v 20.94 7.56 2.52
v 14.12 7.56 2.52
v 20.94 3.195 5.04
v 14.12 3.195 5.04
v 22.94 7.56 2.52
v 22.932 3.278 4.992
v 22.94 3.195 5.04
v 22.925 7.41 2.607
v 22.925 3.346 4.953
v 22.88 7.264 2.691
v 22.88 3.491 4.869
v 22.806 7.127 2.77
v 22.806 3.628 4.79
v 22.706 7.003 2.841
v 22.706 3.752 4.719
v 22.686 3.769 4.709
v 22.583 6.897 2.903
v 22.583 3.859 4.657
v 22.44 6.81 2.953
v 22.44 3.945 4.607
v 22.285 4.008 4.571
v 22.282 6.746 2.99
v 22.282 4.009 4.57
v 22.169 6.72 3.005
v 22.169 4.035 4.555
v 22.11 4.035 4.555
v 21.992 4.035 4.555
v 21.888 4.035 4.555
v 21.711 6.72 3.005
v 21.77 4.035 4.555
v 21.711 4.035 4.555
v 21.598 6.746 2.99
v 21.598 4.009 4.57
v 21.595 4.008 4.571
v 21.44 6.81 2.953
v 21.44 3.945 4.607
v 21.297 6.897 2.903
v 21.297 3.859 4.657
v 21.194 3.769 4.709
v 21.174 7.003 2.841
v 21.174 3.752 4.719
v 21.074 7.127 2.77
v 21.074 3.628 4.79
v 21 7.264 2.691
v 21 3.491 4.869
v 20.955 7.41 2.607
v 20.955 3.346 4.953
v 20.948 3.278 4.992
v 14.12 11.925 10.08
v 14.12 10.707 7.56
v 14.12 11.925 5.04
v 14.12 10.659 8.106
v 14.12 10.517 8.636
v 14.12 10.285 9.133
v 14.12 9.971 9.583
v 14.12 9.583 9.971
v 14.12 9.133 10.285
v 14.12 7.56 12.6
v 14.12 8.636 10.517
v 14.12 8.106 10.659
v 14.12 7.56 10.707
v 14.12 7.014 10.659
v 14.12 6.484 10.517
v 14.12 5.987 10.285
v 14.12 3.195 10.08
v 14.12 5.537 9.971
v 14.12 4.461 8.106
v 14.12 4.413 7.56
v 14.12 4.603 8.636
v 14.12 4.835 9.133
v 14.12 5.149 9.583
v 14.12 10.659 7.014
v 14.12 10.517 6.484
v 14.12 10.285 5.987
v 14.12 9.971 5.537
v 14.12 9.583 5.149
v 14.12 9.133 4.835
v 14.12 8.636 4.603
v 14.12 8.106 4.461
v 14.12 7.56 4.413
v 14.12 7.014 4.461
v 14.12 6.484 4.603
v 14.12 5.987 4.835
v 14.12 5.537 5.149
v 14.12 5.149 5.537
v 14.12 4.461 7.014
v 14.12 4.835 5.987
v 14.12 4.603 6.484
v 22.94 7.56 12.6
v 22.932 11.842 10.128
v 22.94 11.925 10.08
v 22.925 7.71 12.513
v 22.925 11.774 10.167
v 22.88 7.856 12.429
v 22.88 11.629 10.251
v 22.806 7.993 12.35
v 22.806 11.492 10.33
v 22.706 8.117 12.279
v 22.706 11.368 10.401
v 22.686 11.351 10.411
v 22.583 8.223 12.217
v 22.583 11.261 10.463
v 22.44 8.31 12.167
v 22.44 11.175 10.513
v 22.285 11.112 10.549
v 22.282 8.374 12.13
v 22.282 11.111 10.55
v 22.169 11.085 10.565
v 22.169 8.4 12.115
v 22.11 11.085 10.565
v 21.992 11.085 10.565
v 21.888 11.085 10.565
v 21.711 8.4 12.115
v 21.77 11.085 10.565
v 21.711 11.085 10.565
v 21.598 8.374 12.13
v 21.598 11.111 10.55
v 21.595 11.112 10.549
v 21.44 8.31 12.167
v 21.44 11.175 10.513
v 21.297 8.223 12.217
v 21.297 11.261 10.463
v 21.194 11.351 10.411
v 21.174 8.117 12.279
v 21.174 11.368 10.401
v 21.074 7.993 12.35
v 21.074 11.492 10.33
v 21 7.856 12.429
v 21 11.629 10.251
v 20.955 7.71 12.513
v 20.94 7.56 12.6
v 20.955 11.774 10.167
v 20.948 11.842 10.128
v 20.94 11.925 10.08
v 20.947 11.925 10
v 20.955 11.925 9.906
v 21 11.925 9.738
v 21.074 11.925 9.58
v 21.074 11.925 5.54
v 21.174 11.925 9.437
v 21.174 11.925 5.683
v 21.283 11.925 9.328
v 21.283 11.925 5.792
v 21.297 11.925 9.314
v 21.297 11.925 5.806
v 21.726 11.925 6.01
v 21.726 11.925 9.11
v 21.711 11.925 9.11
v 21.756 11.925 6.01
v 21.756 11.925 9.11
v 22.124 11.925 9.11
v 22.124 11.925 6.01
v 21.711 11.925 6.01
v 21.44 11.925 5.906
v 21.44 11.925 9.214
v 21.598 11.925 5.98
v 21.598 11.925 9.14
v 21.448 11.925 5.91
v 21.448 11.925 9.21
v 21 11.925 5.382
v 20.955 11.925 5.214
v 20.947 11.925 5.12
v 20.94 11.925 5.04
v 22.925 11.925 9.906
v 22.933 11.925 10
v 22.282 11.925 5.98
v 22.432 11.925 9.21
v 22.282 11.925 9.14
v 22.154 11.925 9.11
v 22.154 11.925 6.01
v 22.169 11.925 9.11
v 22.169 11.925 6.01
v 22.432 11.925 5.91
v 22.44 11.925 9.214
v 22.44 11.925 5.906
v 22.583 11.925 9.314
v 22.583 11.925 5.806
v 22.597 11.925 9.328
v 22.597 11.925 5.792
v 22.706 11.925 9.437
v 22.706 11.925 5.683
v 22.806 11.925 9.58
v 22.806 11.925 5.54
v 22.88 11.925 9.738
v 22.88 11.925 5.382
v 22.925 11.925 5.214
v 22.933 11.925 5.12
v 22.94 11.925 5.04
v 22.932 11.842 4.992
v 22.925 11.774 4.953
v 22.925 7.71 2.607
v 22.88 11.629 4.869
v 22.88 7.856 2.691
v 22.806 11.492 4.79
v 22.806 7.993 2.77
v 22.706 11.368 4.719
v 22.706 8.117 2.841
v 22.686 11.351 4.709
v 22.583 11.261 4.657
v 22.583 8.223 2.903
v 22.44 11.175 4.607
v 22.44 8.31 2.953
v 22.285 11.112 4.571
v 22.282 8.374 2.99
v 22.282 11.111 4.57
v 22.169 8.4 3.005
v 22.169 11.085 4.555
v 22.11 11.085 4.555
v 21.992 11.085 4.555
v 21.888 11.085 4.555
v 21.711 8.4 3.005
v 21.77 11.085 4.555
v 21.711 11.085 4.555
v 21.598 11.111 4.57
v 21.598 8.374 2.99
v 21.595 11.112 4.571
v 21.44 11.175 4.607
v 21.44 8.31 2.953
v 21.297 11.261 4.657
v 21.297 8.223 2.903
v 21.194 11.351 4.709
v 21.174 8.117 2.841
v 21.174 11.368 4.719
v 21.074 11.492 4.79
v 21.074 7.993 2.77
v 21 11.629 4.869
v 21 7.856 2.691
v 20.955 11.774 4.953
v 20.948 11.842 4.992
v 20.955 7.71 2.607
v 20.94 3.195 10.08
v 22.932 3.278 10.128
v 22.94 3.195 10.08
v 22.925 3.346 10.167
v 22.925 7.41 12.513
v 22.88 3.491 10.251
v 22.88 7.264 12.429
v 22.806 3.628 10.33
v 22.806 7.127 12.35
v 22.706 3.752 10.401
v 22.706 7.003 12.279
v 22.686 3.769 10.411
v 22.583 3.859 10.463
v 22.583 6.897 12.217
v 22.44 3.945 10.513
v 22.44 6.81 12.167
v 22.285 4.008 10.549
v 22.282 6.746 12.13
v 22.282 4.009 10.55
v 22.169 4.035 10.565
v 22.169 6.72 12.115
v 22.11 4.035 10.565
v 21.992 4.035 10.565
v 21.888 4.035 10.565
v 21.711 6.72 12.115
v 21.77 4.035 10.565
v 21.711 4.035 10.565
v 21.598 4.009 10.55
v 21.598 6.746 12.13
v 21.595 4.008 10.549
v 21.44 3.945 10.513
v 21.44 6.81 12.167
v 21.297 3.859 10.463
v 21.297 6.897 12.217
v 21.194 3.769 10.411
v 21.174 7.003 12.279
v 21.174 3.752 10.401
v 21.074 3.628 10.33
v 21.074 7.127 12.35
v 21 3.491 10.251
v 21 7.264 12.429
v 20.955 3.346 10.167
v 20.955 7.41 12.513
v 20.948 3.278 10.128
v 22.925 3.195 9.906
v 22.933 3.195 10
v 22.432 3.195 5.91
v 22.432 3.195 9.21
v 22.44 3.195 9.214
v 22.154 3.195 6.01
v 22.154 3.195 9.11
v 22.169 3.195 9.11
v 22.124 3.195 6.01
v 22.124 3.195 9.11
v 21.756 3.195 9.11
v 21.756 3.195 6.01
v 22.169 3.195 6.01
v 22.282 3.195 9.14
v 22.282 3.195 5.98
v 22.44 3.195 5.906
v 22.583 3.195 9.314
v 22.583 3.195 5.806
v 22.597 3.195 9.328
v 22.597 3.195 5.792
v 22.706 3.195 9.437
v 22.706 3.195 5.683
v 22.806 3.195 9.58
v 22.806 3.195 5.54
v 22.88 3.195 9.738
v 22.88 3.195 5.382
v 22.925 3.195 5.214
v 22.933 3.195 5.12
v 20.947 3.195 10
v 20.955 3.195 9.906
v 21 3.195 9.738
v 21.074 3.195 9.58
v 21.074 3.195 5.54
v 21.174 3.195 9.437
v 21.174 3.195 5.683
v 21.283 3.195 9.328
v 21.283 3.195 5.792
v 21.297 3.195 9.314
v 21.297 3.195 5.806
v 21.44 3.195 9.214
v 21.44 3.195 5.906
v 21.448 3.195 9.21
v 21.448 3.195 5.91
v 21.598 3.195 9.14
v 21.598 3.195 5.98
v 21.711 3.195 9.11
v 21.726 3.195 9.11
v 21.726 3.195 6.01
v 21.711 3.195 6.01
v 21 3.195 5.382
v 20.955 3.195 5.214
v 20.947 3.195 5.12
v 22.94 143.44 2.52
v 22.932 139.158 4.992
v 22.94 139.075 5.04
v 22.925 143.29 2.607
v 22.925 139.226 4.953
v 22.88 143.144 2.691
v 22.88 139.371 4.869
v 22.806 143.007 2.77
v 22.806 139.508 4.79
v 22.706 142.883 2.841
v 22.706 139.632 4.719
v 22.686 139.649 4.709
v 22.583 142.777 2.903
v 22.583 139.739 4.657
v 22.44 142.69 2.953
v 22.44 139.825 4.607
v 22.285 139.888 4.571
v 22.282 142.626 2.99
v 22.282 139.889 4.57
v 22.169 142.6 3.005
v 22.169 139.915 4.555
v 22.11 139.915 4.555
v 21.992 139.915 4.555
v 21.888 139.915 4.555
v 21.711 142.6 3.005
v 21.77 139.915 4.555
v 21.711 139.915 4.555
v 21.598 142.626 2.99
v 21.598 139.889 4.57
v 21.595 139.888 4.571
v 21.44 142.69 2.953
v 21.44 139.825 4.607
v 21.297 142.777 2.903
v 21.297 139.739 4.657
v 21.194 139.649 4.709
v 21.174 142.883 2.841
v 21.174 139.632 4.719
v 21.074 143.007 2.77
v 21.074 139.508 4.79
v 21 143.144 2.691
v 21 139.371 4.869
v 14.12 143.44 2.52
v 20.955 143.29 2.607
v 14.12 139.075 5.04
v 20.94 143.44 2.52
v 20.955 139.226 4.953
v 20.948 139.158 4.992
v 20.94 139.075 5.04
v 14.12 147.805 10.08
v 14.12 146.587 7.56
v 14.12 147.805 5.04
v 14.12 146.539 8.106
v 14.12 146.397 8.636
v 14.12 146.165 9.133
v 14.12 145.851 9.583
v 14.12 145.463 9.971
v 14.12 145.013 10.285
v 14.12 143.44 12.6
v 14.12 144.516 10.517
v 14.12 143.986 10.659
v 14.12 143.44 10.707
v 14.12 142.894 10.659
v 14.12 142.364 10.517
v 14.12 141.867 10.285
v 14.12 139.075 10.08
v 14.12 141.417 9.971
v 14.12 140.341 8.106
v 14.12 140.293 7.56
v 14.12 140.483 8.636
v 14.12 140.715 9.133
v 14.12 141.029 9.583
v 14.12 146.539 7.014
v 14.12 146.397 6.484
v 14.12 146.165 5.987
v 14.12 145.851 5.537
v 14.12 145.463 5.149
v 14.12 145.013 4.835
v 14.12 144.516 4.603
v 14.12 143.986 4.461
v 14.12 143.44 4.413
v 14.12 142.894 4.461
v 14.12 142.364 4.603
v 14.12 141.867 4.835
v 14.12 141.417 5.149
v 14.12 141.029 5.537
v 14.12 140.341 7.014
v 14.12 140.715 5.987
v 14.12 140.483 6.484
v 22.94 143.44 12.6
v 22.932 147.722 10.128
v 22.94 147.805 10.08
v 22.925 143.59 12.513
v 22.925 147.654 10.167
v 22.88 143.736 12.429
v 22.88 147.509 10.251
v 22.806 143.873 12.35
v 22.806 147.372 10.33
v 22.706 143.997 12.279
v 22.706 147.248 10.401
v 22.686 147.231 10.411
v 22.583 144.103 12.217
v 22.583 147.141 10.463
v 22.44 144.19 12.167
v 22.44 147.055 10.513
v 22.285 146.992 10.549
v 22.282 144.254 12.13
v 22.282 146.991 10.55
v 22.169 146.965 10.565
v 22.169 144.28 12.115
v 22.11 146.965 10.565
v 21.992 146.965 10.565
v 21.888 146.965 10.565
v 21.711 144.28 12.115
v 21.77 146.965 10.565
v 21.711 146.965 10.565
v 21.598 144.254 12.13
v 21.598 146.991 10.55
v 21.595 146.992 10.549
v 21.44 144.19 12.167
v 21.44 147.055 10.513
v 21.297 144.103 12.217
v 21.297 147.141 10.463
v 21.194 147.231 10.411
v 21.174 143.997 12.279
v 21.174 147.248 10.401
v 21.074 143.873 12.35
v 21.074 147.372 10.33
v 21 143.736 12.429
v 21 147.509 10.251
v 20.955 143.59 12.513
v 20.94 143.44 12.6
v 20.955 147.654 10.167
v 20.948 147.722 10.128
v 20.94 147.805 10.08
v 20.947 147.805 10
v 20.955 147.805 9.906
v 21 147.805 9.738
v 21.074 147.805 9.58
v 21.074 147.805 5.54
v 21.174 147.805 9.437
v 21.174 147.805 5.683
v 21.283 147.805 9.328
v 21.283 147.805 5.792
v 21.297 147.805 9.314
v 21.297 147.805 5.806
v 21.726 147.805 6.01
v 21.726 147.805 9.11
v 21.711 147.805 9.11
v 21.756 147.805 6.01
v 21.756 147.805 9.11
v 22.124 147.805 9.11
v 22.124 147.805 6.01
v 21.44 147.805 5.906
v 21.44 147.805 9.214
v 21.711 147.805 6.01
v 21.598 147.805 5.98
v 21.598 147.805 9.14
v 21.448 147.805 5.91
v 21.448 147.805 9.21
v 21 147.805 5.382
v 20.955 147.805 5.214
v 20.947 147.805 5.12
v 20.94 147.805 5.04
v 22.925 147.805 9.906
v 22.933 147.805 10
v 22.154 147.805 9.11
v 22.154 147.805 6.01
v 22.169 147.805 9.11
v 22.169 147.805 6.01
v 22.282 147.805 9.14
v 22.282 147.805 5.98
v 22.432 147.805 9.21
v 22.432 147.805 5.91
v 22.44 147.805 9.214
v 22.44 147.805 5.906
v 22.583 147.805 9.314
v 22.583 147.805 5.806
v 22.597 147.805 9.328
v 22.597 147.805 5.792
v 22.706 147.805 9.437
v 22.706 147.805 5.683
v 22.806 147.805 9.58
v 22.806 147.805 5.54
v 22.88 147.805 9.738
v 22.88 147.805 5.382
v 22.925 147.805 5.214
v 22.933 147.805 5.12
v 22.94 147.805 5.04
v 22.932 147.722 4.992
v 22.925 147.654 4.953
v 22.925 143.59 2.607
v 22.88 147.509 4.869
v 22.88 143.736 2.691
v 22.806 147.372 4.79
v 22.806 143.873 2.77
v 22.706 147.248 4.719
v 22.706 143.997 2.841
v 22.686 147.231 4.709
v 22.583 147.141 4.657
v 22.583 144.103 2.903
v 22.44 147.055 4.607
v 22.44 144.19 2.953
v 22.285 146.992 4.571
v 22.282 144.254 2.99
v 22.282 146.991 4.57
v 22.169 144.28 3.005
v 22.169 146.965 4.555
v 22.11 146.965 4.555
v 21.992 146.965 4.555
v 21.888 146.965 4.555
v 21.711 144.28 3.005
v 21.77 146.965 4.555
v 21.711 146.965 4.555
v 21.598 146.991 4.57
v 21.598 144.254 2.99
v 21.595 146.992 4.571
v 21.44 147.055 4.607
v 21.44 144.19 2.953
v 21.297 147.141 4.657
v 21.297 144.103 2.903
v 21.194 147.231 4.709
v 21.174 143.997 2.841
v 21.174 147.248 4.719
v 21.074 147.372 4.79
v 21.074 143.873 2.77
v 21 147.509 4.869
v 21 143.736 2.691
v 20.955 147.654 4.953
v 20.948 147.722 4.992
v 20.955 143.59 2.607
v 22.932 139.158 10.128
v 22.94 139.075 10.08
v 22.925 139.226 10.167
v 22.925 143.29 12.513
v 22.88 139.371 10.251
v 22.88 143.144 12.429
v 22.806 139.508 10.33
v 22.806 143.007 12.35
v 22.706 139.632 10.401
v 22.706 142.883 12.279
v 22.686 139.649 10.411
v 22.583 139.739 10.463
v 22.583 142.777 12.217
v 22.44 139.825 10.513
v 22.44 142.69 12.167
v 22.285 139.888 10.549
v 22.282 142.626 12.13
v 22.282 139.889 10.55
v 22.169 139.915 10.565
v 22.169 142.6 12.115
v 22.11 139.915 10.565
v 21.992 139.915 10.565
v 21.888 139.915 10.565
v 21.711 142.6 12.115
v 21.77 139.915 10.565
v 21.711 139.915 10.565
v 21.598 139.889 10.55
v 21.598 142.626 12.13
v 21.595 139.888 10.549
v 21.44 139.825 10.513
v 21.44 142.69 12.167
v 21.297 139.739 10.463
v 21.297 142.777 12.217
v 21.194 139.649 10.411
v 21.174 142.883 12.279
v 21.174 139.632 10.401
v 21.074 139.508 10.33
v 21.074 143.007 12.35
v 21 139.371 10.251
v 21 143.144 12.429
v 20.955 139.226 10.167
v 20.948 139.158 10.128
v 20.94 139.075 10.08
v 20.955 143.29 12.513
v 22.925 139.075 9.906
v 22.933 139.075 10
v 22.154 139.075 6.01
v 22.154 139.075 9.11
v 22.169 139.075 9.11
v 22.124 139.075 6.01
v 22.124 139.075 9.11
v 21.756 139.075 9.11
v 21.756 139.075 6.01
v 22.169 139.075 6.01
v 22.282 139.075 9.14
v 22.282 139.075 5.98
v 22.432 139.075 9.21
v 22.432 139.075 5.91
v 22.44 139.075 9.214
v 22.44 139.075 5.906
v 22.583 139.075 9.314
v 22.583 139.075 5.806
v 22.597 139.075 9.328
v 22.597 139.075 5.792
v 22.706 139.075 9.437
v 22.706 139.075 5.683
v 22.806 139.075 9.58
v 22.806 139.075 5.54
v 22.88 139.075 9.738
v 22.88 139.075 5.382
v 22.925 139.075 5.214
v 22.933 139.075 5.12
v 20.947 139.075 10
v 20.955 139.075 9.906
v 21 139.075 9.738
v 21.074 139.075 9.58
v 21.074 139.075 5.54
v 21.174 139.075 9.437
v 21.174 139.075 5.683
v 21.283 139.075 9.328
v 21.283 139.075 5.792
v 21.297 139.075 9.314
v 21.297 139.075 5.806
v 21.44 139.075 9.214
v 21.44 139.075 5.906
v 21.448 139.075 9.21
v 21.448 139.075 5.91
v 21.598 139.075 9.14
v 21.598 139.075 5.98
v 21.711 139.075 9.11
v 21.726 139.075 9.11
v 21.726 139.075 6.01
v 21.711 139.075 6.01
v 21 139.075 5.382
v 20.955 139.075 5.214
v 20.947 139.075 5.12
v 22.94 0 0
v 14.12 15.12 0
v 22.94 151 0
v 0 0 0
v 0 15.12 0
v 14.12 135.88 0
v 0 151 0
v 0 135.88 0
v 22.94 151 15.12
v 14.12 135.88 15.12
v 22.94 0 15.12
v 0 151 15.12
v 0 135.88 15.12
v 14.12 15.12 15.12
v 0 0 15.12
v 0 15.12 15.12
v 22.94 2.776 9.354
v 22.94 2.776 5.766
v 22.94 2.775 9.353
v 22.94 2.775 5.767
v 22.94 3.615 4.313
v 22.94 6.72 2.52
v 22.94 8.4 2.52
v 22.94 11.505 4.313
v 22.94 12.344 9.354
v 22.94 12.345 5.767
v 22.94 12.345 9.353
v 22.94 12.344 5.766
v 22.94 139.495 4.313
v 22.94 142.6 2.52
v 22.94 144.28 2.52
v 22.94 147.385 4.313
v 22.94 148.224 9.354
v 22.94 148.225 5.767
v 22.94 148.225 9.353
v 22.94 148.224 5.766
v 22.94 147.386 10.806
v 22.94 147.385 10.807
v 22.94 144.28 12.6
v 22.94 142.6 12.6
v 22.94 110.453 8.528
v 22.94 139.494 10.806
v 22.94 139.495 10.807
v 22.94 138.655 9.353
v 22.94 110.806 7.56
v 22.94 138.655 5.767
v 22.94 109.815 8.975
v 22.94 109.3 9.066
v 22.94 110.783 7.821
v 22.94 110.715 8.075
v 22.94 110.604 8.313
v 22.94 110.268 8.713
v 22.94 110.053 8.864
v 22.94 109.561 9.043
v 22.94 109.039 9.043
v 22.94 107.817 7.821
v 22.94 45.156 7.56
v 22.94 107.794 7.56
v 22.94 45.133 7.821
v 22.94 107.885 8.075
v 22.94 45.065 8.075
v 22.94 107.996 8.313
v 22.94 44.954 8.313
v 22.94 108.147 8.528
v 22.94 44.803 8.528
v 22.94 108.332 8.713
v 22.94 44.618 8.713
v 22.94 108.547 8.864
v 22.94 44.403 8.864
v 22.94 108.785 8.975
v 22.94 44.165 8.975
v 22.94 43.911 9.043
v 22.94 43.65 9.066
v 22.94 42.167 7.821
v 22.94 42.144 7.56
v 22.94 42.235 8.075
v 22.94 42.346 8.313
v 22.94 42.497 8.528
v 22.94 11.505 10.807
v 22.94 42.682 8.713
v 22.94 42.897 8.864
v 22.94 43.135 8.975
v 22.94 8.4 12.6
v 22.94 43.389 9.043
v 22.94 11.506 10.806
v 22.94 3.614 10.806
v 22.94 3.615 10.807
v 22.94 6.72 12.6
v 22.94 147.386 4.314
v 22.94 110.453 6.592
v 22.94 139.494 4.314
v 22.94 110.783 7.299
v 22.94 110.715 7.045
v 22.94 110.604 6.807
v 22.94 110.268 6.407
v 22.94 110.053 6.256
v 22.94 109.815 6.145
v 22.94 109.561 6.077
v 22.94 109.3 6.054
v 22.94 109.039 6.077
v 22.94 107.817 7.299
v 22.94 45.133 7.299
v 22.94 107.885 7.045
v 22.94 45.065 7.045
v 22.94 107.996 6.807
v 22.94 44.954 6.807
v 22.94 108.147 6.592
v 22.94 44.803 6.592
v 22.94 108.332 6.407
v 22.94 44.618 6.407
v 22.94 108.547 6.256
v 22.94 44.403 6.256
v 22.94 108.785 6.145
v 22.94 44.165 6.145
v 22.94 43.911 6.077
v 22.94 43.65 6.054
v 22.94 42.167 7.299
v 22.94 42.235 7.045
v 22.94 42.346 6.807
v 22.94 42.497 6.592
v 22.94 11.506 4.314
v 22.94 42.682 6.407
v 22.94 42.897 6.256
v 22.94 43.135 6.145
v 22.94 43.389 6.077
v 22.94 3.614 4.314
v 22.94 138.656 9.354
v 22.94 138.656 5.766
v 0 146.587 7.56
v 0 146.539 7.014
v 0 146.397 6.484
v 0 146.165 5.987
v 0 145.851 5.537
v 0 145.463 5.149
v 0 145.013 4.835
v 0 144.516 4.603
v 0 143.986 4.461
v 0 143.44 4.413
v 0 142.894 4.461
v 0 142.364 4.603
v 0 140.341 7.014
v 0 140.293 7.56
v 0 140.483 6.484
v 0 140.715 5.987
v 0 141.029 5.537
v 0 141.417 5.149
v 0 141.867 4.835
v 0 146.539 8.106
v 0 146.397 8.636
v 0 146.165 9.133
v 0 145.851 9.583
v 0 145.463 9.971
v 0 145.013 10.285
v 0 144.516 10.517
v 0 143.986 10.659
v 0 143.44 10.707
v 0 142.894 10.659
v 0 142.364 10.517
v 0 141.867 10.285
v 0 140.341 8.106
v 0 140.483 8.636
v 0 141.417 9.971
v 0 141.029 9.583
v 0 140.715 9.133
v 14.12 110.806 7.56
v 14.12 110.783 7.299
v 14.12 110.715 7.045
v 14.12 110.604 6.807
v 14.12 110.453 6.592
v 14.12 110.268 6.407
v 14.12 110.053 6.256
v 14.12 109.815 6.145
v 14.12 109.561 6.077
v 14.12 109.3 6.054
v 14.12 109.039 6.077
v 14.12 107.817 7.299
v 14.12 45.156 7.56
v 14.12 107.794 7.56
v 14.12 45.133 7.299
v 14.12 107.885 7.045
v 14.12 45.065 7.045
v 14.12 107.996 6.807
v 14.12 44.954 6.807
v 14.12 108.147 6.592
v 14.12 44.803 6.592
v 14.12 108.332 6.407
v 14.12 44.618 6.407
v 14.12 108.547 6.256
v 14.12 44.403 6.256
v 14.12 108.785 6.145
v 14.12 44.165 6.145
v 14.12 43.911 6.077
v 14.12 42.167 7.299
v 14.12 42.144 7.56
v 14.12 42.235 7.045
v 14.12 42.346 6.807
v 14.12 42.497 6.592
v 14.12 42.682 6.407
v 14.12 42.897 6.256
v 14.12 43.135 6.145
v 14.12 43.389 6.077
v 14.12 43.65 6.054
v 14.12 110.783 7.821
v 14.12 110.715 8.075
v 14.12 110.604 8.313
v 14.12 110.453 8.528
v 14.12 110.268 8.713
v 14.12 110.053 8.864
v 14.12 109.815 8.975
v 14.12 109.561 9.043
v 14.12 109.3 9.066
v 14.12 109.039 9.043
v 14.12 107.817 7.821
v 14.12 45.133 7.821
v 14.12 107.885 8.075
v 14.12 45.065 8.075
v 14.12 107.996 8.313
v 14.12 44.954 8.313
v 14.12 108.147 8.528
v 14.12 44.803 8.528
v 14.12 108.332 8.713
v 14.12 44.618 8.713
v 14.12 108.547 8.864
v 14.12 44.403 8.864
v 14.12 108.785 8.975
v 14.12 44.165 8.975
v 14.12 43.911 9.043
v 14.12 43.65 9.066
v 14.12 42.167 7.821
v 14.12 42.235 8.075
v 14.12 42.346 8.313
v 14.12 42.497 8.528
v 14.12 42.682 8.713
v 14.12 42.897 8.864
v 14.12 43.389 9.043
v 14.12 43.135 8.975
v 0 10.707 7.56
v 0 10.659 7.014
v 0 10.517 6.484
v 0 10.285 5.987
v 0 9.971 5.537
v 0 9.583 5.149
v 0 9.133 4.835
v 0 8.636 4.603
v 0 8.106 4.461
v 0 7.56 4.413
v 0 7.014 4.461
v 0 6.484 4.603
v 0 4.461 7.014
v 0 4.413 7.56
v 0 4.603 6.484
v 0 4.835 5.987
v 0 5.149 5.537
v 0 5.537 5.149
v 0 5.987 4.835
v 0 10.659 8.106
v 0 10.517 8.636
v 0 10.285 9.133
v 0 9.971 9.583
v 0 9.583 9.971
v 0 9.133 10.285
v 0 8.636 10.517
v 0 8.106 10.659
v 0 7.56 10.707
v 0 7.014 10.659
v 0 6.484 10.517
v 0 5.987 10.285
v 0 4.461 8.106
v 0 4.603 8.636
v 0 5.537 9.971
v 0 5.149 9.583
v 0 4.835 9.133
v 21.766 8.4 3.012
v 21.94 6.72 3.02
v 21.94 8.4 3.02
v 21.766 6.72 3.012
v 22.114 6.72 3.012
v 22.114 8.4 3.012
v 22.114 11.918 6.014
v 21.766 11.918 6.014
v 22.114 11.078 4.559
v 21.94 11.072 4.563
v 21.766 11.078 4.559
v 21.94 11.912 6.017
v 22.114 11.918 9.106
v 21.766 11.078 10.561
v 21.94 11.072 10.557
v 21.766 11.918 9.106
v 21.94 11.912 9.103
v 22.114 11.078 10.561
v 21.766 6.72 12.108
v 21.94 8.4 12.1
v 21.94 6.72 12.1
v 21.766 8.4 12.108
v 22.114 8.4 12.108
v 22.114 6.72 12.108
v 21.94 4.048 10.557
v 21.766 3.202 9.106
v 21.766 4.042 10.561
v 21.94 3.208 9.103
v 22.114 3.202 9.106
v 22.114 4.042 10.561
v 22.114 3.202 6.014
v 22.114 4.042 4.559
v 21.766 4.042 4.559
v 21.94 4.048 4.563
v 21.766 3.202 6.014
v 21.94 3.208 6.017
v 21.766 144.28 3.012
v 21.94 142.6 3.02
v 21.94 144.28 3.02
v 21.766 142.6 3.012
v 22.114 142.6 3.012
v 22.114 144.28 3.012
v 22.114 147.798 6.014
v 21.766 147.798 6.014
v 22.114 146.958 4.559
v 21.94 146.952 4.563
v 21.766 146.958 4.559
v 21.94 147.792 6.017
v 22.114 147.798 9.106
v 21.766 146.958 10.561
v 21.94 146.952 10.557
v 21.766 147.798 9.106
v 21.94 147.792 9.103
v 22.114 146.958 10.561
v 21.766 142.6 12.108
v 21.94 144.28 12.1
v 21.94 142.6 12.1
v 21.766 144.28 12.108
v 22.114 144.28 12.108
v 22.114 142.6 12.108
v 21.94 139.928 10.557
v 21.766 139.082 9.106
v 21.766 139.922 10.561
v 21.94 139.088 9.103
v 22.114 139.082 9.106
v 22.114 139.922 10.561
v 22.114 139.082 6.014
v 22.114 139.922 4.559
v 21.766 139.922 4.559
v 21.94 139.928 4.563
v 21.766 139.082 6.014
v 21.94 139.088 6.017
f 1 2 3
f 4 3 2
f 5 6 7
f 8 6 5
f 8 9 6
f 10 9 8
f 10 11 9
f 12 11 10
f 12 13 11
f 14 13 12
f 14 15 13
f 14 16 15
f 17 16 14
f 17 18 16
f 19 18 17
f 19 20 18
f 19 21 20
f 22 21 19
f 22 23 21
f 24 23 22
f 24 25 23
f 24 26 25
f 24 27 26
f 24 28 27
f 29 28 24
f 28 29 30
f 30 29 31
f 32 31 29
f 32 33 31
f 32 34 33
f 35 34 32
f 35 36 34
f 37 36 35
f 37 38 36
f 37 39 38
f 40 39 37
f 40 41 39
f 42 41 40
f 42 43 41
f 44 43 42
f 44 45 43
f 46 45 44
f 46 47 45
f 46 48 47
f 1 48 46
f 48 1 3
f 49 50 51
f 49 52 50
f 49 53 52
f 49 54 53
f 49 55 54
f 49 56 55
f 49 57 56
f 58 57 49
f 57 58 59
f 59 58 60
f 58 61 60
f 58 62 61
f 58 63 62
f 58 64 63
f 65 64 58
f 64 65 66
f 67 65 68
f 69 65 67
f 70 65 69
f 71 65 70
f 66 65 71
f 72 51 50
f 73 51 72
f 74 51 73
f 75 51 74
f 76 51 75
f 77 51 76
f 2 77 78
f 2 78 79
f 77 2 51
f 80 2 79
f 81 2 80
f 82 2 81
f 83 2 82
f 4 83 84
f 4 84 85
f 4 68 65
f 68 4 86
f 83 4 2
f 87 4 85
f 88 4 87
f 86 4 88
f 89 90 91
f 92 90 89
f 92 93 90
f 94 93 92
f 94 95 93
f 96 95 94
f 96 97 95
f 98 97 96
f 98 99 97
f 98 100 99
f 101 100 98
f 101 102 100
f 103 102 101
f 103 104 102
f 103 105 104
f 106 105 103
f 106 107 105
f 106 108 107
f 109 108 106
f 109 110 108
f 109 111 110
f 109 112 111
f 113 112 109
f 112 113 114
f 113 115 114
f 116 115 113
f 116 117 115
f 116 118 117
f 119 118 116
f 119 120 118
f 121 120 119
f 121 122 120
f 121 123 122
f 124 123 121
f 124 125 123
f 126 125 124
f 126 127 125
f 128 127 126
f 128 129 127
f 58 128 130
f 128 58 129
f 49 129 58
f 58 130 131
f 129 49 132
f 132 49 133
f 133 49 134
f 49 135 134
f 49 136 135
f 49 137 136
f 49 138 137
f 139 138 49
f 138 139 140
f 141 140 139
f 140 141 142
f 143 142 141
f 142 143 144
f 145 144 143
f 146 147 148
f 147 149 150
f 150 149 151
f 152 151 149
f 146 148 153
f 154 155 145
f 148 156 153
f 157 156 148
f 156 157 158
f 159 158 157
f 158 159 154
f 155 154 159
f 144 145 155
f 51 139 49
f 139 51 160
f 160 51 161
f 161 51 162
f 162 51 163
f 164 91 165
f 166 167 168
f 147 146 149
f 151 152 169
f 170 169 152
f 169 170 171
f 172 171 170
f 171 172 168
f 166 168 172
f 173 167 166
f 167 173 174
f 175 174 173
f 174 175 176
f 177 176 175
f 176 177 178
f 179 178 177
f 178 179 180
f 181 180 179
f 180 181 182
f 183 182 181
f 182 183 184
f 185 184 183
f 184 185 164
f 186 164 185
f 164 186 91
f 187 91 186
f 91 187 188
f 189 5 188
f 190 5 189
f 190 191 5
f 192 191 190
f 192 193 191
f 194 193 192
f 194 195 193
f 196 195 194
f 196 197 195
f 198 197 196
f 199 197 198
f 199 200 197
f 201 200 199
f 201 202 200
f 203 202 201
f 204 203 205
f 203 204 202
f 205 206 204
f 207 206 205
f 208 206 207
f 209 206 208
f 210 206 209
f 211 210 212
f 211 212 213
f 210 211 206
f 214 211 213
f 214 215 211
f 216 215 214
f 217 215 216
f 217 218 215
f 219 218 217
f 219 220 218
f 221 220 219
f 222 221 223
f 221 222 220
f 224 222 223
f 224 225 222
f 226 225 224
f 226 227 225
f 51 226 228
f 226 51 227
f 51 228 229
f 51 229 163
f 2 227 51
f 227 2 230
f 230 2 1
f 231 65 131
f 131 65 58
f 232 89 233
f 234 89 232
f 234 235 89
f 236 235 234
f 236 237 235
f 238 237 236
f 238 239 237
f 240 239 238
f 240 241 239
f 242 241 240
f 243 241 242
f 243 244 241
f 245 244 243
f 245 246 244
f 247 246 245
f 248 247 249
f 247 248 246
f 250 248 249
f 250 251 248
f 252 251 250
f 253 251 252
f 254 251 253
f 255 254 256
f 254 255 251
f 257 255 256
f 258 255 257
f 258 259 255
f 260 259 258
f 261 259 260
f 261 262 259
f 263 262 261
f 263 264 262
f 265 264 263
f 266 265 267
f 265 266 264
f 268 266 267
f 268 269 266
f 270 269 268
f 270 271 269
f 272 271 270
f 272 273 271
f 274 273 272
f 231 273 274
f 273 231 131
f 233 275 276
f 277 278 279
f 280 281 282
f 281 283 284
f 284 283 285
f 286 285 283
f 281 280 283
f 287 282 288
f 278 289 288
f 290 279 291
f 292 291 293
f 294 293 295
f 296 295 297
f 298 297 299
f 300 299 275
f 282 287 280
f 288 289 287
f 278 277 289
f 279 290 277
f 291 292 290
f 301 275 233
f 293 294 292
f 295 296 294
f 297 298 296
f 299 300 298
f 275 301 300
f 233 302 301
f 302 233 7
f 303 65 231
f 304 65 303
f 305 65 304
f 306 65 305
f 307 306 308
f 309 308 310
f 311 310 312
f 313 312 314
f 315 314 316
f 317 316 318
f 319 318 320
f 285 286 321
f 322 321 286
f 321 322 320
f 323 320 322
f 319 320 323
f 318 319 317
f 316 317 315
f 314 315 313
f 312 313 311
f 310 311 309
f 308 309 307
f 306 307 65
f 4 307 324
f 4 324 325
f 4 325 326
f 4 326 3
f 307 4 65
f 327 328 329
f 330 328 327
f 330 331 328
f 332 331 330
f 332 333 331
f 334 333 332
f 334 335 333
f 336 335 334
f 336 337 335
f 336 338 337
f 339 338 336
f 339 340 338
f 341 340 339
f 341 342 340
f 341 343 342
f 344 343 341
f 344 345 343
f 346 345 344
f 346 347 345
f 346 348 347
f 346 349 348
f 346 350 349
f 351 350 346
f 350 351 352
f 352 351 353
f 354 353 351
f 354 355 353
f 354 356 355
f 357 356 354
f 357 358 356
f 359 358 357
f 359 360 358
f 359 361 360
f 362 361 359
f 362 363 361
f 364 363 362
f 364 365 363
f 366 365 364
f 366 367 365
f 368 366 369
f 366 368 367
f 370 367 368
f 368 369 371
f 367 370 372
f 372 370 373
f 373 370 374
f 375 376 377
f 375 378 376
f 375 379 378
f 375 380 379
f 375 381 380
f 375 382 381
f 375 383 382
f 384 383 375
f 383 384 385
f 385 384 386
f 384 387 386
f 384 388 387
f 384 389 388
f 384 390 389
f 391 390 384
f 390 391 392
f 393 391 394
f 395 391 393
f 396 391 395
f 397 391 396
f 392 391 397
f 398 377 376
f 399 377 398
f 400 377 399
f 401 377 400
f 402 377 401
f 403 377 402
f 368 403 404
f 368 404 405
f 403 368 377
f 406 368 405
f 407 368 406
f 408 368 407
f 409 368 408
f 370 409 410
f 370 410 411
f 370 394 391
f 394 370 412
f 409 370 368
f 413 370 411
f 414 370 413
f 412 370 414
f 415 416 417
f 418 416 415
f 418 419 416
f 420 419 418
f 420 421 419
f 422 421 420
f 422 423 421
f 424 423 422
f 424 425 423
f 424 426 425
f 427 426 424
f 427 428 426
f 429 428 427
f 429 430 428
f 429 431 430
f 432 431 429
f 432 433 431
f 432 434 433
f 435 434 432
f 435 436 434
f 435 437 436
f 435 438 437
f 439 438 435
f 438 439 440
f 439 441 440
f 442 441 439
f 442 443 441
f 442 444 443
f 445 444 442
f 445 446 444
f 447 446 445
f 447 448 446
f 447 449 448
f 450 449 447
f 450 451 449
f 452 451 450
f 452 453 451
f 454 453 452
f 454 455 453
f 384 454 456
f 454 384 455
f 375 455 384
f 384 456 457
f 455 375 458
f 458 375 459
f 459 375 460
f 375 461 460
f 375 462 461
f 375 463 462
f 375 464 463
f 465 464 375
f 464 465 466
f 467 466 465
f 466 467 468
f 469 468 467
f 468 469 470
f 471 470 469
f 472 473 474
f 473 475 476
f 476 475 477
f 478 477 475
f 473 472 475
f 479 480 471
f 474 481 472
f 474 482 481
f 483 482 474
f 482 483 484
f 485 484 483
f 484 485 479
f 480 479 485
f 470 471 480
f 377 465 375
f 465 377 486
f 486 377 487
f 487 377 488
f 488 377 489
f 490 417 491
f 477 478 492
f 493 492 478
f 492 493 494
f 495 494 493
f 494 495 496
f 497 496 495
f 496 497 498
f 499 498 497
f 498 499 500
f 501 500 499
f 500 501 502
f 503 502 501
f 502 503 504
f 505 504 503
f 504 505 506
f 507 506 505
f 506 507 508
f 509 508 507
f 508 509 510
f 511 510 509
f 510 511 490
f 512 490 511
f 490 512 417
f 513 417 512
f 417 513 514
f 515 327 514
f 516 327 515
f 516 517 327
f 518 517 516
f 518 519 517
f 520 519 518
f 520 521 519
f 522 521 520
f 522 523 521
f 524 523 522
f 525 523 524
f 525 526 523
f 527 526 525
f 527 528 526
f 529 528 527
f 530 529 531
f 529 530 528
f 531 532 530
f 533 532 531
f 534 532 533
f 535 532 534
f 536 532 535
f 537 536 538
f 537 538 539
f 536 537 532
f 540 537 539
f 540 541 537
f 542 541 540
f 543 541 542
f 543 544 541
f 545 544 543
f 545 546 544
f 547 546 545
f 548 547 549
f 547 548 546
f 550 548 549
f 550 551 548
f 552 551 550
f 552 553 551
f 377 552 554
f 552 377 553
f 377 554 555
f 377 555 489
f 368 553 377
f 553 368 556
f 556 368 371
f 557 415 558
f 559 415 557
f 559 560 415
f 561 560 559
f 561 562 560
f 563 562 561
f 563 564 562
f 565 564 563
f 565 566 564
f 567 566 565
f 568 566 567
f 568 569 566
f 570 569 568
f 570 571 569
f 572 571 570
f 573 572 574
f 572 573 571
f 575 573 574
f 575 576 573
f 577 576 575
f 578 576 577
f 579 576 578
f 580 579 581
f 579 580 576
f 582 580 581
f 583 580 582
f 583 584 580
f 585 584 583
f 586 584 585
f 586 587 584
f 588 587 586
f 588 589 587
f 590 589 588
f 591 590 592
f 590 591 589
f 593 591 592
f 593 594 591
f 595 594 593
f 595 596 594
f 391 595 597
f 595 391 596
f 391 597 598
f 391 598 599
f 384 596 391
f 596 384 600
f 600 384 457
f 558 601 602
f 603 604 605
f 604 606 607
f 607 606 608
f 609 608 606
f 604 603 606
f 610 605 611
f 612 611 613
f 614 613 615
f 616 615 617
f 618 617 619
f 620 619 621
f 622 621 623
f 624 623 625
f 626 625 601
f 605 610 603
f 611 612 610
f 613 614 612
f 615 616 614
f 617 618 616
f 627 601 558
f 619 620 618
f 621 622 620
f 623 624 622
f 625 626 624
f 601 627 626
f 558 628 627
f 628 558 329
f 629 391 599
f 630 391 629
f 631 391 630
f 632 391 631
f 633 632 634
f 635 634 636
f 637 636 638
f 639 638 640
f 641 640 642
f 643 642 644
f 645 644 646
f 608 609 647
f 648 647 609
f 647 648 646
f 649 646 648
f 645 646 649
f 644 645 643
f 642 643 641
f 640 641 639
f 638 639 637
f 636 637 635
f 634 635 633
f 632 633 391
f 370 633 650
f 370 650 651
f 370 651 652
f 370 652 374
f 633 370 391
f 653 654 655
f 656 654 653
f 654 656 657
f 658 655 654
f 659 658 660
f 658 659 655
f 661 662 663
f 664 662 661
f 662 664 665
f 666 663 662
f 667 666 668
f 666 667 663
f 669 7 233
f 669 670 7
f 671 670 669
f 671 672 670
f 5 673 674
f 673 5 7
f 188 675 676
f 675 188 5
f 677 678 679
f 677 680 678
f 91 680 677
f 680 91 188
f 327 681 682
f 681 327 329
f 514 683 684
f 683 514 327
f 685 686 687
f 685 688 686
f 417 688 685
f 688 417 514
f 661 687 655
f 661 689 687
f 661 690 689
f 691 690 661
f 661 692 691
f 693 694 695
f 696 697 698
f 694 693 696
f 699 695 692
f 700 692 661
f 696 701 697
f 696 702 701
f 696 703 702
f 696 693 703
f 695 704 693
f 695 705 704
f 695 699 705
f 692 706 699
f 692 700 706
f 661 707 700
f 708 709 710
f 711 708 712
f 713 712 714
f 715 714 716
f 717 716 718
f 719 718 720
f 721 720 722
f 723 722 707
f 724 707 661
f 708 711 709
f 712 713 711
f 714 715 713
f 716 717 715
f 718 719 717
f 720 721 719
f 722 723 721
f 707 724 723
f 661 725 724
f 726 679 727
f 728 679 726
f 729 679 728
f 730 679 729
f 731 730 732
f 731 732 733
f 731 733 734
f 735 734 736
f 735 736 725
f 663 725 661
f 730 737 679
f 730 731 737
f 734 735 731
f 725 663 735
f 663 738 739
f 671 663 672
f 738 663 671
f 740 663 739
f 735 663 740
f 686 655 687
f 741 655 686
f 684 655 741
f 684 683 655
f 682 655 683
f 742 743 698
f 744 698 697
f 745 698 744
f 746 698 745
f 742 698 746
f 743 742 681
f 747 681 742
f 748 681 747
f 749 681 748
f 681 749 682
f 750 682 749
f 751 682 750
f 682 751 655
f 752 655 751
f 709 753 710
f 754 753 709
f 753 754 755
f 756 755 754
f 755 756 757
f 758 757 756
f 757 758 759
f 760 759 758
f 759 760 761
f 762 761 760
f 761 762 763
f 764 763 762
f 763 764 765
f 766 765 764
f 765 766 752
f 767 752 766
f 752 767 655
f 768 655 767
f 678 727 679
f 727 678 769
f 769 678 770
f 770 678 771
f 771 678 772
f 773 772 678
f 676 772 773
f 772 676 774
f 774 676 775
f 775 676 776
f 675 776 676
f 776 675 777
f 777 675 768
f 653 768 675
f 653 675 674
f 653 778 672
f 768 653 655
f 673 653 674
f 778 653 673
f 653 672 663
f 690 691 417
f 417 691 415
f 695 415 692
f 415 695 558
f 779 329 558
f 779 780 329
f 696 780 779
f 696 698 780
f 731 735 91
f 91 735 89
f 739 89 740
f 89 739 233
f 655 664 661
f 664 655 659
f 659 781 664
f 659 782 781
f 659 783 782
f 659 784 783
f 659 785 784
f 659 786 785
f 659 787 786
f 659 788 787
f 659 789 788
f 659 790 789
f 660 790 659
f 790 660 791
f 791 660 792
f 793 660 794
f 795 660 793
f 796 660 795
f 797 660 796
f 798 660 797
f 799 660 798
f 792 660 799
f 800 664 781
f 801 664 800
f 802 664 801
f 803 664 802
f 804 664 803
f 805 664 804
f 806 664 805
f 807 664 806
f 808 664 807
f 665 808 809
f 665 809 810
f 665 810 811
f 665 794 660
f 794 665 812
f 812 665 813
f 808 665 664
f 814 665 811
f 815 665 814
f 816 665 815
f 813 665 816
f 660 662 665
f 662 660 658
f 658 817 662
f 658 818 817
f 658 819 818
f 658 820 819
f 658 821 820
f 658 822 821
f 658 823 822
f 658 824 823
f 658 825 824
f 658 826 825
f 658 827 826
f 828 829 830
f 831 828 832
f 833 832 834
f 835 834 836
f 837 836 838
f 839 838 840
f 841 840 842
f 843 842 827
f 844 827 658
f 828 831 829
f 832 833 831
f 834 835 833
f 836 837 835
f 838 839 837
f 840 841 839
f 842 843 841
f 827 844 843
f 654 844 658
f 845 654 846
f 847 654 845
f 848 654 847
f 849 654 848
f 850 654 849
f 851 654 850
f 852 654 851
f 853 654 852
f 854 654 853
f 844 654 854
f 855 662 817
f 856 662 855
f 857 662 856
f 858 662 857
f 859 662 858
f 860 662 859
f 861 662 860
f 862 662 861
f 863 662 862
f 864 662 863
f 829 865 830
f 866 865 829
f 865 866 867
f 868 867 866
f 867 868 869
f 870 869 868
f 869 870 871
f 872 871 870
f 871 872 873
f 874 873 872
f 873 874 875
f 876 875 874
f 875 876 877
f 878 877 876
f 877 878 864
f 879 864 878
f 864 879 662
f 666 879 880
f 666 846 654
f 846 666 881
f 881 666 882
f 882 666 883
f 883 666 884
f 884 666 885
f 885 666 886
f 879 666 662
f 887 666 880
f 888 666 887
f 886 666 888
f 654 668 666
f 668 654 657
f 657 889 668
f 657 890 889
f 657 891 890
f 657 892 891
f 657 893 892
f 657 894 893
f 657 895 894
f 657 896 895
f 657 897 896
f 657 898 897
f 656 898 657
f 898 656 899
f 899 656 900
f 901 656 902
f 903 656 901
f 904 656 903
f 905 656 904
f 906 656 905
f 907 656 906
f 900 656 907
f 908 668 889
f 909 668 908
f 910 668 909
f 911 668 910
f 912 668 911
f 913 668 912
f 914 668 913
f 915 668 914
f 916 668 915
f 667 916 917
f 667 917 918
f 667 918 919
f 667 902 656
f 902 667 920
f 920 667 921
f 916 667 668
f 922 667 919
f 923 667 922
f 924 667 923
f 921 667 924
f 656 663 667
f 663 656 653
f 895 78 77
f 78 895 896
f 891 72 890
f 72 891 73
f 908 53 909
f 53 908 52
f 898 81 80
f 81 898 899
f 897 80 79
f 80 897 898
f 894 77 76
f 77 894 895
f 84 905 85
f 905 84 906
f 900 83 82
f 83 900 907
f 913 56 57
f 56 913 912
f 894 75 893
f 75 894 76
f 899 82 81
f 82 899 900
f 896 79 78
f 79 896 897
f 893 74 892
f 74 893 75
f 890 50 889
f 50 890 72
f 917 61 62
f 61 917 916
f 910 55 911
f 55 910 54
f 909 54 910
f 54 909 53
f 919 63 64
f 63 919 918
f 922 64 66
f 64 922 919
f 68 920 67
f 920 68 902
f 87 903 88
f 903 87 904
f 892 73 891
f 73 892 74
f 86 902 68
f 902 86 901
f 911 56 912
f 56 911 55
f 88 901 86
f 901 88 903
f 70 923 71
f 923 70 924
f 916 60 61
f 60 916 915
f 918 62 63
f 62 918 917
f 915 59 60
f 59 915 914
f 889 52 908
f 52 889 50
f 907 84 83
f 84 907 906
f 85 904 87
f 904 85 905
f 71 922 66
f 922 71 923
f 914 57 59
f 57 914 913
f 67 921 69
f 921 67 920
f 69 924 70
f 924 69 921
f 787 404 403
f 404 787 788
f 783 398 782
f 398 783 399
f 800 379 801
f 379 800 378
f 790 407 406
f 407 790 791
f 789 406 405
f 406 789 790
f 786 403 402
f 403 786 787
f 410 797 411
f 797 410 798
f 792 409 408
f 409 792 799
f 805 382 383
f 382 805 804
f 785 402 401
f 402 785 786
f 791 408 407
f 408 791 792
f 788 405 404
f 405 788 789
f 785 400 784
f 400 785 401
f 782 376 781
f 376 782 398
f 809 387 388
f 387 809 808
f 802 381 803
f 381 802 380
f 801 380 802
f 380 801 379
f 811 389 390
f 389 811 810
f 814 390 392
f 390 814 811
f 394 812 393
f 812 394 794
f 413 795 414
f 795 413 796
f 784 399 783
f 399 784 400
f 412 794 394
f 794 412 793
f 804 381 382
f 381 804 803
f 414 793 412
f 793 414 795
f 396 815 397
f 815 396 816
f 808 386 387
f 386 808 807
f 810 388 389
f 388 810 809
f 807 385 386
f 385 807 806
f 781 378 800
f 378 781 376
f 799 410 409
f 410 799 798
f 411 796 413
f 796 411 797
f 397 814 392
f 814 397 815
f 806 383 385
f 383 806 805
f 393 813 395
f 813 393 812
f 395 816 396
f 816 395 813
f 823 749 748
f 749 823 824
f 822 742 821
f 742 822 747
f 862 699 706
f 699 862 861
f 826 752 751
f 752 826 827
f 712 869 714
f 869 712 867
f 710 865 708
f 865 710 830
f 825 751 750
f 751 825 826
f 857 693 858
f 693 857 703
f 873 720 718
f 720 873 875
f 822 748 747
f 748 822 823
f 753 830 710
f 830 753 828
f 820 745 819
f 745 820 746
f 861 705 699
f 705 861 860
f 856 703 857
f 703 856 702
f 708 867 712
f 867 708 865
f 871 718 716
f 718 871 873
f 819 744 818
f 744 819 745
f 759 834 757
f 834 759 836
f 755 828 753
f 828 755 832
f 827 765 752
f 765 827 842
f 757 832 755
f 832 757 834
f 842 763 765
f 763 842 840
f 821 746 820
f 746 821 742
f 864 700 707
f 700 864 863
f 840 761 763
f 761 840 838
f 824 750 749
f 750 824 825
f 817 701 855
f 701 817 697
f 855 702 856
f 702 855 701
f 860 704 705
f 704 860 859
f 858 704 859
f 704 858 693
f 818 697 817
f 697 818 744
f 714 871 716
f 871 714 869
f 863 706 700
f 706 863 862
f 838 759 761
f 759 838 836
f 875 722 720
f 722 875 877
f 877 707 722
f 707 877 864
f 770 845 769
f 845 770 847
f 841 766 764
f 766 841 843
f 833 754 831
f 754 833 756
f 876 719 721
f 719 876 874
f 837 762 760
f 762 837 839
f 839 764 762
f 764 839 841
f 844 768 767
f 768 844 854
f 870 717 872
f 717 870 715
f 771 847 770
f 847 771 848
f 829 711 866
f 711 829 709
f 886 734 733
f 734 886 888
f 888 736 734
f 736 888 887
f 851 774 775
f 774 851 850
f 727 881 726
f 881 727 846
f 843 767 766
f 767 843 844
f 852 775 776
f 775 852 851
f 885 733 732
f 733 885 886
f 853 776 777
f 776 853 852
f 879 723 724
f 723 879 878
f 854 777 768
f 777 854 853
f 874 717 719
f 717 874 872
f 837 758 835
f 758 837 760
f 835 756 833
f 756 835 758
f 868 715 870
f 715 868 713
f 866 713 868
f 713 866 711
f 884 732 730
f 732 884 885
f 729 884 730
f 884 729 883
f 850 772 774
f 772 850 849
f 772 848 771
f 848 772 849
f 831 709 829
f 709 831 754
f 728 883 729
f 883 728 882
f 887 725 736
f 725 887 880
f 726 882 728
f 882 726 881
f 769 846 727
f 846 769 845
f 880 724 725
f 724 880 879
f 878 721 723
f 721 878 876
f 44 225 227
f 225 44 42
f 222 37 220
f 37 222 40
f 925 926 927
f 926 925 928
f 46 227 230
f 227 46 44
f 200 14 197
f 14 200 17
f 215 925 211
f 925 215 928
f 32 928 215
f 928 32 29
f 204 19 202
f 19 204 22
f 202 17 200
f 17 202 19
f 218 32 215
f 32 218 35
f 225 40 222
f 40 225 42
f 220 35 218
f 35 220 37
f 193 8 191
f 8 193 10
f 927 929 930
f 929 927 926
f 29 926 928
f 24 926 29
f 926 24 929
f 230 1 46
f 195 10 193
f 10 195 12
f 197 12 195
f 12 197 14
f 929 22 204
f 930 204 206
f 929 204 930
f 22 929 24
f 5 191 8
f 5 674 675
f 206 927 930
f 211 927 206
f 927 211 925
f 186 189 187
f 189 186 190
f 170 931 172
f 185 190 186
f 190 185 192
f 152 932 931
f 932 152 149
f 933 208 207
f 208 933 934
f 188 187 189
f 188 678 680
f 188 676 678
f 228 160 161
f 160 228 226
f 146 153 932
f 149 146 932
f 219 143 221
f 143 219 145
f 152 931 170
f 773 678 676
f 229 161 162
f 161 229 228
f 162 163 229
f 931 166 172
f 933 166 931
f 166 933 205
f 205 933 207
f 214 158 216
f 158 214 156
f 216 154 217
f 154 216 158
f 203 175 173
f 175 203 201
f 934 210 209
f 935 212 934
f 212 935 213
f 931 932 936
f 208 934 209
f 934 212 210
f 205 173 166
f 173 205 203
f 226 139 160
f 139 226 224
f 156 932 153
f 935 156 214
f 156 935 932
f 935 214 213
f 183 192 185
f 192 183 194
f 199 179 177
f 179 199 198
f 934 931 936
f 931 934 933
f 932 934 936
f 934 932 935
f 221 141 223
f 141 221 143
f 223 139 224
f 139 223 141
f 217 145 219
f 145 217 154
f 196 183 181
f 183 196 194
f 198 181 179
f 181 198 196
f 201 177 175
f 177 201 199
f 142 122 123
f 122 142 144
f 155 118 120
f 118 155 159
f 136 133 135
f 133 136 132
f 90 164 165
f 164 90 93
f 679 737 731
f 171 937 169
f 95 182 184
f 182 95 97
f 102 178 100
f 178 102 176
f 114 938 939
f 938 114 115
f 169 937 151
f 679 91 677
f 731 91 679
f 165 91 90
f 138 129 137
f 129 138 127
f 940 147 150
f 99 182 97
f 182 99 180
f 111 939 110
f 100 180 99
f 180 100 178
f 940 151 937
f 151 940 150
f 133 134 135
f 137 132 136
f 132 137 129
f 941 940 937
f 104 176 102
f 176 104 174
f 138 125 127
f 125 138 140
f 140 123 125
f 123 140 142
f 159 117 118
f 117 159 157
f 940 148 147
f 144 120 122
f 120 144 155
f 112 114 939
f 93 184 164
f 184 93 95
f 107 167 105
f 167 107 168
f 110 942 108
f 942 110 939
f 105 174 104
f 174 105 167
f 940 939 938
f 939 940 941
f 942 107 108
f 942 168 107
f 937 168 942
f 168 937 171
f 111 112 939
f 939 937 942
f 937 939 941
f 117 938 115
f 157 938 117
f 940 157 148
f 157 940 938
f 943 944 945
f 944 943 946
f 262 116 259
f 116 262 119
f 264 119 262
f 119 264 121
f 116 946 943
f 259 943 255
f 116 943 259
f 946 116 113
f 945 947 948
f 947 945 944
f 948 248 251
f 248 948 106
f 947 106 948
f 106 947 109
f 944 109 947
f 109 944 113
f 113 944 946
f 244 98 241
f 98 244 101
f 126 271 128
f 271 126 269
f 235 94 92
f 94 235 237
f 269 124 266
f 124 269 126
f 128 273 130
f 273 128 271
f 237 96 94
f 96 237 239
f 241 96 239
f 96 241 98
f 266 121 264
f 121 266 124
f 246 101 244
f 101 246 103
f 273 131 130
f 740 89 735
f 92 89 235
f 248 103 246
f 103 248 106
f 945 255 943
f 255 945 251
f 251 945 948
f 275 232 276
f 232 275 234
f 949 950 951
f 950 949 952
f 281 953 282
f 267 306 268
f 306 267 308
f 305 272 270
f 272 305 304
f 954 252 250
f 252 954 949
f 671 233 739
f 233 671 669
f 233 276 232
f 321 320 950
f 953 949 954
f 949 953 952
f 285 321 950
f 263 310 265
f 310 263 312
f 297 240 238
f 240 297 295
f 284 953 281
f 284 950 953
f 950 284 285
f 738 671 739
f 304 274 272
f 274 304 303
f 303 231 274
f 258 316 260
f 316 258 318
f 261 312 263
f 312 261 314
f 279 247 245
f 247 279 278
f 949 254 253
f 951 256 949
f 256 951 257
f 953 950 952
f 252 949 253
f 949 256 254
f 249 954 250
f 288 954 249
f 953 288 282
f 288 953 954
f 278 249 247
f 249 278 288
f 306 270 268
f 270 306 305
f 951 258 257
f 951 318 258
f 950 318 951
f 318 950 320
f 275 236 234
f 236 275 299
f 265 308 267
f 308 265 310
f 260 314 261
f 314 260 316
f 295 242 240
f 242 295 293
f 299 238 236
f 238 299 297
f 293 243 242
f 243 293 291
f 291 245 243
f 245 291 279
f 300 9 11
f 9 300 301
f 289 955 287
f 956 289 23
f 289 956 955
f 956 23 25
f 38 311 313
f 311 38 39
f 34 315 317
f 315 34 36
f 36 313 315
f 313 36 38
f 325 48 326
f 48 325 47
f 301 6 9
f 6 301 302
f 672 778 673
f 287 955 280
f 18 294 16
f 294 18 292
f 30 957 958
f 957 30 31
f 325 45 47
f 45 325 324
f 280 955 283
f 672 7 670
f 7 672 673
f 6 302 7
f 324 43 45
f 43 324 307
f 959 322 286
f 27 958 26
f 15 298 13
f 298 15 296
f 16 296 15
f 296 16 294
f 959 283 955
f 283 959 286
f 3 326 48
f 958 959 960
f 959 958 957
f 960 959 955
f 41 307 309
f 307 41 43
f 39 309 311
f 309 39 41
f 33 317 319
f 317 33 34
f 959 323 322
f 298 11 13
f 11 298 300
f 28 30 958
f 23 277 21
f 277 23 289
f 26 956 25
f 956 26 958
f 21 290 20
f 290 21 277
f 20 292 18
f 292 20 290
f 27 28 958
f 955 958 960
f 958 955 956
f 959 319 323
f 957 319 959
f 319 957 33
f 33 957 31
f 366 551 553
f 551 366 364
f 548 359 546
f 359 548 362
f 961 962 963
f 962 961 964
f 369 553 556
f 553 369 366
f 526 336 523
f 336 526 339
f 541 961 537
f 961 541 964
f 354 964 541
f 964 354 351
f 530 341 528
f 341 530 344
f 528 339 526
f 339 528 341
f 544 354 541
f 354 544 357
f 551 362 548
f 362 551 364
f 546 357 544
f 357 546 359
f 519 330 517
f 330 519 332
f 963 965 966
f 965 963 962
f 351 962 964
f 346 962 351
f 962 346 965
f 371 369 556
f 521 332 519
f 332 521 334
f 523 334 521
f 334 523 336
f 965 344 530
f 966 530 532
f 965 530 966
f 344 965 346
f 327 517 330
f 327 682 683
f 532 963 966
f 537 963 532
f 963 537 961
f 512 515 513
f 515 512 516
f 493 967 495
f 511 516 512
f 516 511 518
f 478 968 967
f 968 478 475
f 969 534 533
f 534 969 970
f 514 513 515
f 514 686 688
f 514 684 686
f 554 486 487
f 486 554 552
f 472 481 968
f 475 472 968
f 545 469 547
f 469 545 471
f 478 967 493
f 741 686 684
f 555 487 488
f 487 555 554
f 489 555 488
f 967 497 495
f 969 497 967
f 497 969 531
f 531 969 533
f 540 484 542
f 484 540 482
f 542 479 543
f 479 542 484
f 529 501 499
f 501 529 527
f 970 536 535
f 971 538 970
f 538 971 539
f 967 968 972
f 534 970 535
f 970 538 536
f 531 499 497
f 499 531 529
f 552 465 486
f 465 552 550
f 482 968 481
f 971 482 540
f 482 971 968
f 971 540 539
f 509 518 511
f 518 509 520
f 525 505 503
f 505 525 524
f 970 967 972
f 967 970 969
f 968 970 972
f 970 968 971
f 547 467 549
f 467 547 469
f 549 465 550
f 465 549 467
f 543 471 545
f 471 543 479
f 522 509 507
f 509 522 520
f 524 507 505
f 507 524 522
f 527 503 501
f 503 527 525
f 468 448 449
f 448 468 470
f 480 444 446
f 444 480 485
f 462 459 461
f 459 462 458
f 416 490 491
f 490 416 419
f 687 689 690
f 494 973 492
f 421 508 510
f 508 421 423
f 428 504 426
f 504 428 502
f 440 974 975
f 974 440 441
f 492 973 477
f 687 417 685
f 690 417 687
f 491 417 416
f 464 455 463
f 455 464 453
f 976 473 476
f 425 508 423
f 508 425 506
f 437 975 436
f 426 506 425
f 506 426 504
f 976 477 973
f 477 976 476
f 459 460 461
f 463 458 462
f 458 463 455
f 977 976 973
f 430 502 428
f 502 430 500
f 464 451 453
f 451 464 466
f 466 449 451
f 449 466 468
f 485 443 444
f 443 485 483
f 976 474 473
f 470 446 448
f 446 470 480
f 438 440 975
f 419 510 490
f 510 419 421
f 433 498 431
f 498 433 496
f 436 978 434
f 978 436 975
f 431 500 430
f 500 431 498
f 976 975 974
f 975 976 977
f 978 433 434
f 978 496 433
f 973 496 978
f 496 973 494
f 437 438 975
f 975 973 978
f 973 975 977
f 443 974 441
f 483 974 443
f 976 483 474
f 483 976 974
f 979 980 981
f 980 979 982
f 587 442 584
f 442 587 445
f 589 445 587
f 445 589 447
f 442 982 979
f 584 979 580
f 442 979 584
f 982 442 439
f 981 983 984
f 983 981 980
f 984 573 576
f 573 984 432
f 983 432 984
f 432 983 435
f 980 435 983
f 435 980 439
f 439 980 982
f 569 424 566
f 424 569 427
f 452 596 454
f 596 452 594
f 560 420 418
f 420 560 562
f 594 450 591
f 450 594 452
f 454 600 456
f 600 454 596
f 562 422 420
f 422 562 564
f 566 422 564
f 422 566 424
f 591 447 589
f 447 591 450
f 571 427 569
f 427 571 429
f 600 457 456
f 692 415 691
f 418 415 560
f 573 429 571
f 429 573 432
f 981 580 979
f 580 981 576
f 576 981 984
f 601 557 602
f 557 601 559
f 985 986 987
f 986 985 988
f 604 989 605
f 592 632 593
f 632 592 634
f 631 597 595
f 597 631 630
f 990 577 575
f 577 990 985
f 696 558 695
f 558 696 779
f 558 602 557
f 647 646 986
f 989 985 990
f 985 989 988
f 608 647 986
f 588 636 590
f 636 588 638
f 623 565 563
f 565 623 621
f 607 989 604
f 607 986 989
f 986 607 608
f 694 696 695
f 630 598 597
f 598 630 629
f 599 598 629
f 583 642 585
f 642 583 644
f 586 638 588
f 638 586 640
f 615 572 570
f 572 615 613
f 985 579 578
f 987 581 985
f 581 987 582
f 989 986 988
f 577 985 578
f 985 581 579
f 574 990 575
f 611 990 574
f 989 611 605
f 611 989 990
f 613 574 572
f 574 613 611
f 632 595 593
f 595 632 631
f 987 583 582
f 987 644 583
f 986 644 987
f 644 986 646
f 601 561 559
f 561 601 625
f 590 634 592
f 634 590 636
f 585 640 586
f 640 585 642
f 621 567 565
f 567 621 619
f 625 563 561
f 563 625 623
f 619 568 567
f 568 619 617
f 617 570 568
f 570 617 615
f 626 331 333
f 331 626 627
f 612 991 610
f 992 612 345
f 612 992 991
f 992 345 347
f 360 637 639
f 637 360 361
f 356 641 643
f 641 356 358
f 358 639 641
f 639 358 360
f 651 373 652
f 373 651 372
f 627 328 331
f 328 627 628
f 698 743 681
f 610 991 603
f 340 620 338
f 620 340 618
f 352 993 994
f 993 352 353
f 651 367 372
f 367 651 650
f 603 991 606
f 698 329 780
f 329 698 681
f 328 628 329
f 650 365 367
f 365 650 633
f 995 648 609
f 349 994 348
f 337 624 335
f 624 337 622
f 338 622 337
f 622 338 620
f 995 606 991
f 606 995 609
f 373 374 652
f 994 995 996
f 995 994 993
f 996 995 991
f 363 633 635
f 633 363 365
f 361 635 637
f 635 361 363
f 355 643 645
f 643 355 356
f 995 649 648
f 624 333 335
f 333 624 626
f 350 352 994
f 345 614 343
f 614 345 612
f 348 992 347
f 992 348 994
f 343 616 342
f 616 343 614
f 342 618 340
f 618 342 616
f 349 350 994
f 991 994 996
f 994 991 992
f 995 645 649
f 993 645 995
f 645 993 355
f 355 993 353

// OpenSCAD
/* [Global] */
// Space to add between ridge and top and bottom of screen
screen_extra_spacing = 5;
// Added to screen thickness to allow a seal/gasket
gasket_thickness = 5;
// As measured along M6 bolts
bracket_screw_diameter = 5.87;

/* [Captured Nut] */
do_captured_nuts = true;
nut_width = 9.88;
nut_depth = 5.82;
nut_bury_offset = 3;
detent_arc = 0.5;
detent_width = 2;


/* [Hidden] */
clearance_tight = 0.2;
clearance_loose = 0.4;
pi_screen_depth = 9.12;
pi_screen_height = 110.76;

// M6 bolts
adjusted_bracket_screw_diameter = bracket_screw_diameter + clearance_loose;


adjusted_nut_depth = nut_depth + nut_bury_offset;

adjusted_nut_width = nut_width + clearance_tight;

brace_thickness = adjusted_nut_depth;
brace_width = adjusted_nut_width * 1.5;
ridge_height = adjusted_nut_width * 1.5;

total_brace_depth = pi_screen_depth + brace_thickness + gasket_thickness;
total_brace_y = pi_screen_height + ridge_height * 2 + screen_extra_spacing * 2;
// M3 bolts
pi_screen_screw_diameter = 3;

bracket_screw_radius = adjusted_bracket_screw_diameter / 2; 

pi_screen_screw_radius = pi_screen_screw_diameter / 2;

echo(total_brace_y, " mm length");
echo(total_brace_depth, " mm depth");

module cylinder_outer(height,radius,fn=36){
   fudge = 1/cos(180/fn);
   cylinder(h=height,r=radius*fudge,$fn=fn);}

module DetentRing(radius, arc, width) {
    cylinder_base_radius = 1;
    cylinder_length = radius / 3;
    for(angle = [0:60:300]) {
        x_pos = cos(angle) * radius;
        y_pos = sin(angle) * radius;
        x_rot = 90 - angle;
        translate([x_pos, y_pos, 0]) rotate([x_rot,90,0]) resize([width, 2 * arc, cylinder_length])  cylinder(h=cylinder_length, r1=cylinder_base_radius, r2=cylinder_base_radius, center=true, $fn=36);
    }
}

difference() {
    linear_extrude(brace_width) difference() {
        square([
            total_brace_depth,
            total_brace_y,
            ]
        );
        
        translate([0, ridge_height, 0]) square([
            pi_screen_depth + gasket_thickness,
            pi_screen_height + 2 * screen_extra_spacing
        ]);
    }
    
    // holes for the bracket itself
    translate([-1, ridge_height / 2, brace_width / 2]) rotate([0, 90, 0]) cylinder_outer(total_brace_depth + 2, bracket_screw_radius);
    
    translate([-1, total_brace_y - ridge_height / 2, brace_width / 2]) rotate([0, 90, 0]) cylinder_outer(total_brace_depth + 2, bracket_screw_radius);
    
    if (do_captured_nuts) {
        // area for captured nuts
        translate([total_brace_depth - adjusted_nut_depth, ridge_height / 2, brace_width / 2]) {
            rotate([0, 90, 0]) linear_extrude(adjusted_nut_width) circle(d=adjusted_nut_width, $fn=6);
        }

        translate([total_brace_depth - adjusted_nut_depth, total_brace_y - ridge_height / 2, brace_width / 2]) rotate([0, 90, 0]) linear_extrude(adjusted_nut_width) circle(d=adjusted_nut_width, $fn=6);
    };

    // holes for the screen
    translate([-1, (ridge_height + pi_screen_height + screen_extra_spacing) - 21.58, brace_width / 2]) rotate([0, 90, 0]) cylinder_outer(total_brace_depth + 2, pi_screen_screw_radius);
    
    translate([-1, (ridge_height + pi_screen_height + screen_extra_spacing) - 21.58 - 65.65, brace_width / 2]) rotate([0, 90, 0]) cylinder_outer(total_brace_depth + 2, pi_screen_screw_radius);
}

if (do_captured_nuts) {
    // detents
    translate([total_brace_depth - detent_width / 2, ridge_height / 2, brace_width / 2]) rotate([0, 90, 0]) DetentRing(adjusted_nut_width / 2, detent_arc, detent_width);

    translate([total_brace_depth - detent_width / 2, total_brace_y - ridge_height / 2, brace_width / 2]) rotate([0, 90, 0]) DetentRing(adjusted_nut_width / 2, detent_arc, detent_width);
};
